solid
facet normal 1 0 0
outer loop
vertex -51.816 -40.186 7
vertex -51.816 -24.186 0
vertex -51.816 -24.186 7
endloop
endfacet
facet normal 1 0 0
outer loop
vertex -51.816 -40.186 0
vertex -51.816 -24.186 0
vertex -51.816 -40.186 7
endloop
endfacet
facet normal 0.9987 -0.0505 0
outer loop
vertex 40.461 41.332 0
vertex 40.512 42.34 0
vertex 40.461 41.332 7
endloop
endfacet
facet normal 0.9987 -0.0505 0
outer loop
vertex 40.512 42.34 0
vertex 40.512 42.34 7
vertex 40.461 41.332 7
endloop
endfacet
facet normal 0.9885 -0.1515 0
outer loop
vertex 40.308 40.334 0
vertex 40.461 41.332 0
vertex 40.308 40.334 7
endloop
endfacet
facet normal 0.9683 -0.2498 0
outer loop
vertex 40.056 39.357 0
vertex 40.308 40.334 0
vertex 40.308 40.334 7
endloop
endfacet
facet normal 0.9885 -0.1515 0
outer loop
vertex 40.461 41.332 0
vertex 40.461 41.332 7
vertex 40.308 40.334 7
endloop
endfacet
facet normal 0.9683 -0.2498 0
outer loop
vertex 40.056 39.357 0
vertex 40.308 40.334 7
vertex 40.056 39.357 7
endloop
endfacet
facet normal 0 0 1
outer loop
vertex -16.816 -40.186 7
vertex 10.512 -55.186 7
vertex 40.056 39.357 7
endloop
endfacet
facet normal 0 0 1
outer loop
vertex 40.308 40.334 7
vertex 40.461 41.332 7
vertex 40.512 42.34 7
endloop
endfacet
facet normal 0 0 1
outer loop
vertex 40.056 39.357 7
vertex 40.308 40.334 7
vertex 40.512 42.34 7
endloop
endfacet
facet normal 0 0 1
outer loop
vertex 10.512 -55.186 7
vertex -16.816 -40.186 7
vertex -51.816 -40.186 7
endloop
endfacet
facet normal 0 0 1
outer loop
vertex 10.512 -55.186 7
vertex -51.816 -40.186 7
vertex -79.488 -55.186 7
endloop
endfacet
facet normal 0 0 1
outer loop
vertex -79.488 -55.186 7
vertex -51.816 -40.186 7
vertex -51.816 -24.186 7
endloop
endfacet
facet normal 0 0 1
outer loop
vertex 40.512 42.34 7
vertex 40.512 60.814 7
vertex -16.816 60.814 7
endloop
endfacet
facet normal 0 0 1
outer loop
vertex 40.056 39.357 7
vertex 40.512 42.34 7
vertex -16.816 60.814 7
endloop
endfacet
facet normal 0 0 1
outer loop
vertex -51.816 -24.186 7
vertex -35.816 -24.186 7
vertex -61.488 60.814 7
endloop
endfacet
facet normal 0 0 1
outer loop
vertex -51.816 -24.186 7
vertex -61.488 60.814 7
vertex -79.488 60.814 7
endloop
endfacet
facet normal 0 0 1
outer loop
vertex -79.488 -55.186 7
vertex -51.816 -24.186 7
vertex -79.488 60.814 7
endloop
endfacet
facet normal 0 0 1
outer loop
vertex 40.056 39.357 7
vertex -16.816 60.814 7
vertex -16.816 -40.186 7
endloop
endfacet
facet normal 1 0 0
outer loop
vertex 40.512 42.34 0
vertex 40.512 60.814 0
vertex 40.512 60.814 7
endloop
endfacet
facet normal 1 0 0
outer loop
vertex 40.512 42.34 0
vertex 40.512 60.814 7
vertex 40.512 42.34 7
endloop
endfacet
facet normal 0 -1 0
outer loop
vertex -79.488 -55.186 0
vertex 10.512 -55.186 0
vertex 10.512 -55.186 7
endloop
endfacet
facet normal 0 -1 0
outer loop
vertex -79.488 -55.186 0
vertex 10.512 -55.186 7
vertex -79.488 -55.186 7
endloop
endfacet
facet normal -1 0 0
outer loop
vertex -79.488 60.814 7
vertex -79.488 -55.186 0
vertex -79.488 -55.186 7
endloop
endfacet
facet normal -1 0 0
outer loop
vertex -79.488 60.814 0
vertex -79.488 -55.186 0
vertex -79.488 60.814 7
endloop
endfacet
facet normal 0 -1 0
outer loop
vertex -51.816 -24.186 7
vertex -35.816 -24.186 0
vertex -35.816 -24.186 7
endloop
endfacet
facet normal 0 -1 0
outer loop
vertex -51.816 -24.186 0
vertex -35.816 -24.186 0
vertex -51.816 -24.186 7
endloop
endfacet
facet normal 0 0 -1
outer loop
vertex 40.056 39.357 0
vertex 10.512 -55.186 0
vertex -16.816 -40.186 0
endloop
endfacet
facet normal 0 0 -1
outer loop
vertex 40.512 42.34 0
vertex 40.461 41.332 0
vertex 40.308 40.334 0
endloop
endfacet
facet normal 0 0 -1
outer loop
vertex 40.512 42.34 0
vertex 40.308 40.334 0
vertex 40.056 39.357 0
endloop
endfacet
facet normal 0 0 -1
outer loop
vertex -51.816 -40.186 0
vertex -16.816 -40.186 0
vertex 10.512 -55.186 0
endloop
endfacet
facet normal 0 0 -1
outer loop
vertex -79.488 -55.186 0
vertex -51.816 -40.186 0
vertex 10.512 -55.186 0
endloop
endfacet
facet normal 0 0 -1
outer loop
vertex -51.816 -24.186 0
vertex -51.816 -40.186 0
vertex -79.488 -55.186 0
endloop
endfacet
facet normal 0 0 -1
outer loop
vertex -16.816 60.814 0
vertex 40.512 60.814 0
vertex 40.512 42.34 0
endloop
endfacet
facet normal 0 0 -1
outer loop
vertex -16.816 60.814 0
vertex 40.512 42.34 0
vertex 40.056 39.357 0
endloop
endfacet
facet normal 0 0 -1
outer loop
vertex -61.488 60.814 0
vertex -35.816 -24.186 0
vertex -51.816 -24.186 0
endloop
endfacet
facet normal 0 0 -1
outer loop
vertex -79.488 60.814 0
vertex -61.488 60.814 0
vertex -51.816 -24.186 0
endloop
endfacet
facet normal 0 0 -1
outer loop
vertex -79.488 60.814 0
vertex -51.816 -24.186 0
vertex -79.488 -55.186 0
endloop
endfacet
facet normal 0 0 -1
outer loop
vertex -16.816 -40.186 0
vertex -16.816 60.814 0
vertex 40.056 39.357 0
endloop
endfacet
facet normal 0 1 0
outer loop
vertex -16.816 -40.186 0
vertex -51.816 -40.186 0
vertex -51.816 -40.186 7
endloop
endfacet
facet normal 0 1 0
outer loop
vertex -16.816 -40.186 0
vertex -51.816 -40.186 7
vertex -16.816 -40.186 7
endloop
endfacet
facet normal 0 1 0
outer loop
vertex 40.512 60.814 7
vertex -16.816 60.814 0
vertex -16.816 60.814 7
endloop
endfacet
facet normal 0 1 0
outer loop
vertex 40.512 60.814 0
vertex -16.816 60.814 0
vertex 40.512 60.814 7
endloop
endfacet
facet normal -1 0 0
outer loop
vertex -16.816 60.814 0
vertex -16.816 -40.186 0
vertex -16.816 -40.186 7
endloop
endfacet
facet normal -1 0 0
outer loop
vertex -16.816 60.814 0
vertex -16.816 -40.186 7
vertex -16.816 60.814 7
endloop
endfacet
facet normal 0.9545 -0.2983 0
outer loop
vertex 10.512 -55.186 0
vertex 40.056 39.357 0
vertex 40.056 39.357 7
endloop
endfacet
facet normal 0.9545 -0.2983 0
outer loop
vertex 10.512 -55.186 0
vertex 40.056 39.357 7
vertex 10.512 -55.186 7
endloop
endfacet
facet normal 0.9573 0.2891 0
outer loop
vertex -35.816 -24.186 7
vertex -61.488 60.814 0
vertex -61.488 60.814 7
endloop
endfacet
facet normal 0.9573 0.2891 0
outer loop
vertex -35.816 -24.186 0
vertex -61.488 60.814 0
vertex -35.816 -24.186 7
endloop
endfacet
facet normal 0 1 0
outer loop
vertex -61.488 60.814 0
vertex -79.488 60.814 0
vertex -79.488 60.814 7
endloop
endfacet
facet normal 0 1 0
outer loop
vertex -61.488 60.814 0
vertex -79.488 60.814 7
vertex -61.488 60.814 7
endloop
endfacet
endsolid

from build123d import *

# Parameters (mm, degrees)
EXTRUDE_1_DEPTH = 7
FILLET_1_R      = 10


with BuildPart() as part:
    # 草图1 → 凸台-拉伸1 (new body)
    with BuildSketch(Plane.XY):
        Polygon((-79.488423121, 60.813672833), (-61.488423121, 60.813672833), (-35.816291974, -24.186327167), (-51.816291974, -24.186327167), (-51.816291974, -40.186327167), (-16.816291974, -40.186327167), (-16.816291974, 60.813672833), (40.511576879, 60.813672833), (40.511576879, 40.813672833), (10.511576879, -55.186327167), (-79.488423121, -55.186327167), align=None)
    extrude(amount=EXTRUDE_1_DEPTH)

    # 圆角1
    fillet_1_edges = [part.edges().sort_by_distance(p)[0] for p in [
        (40.511576879, 40.813672833, 3.5),
    ]]
    fillet(fillet_1_edges, radius=FILLET_1_R)


solid = part.part
